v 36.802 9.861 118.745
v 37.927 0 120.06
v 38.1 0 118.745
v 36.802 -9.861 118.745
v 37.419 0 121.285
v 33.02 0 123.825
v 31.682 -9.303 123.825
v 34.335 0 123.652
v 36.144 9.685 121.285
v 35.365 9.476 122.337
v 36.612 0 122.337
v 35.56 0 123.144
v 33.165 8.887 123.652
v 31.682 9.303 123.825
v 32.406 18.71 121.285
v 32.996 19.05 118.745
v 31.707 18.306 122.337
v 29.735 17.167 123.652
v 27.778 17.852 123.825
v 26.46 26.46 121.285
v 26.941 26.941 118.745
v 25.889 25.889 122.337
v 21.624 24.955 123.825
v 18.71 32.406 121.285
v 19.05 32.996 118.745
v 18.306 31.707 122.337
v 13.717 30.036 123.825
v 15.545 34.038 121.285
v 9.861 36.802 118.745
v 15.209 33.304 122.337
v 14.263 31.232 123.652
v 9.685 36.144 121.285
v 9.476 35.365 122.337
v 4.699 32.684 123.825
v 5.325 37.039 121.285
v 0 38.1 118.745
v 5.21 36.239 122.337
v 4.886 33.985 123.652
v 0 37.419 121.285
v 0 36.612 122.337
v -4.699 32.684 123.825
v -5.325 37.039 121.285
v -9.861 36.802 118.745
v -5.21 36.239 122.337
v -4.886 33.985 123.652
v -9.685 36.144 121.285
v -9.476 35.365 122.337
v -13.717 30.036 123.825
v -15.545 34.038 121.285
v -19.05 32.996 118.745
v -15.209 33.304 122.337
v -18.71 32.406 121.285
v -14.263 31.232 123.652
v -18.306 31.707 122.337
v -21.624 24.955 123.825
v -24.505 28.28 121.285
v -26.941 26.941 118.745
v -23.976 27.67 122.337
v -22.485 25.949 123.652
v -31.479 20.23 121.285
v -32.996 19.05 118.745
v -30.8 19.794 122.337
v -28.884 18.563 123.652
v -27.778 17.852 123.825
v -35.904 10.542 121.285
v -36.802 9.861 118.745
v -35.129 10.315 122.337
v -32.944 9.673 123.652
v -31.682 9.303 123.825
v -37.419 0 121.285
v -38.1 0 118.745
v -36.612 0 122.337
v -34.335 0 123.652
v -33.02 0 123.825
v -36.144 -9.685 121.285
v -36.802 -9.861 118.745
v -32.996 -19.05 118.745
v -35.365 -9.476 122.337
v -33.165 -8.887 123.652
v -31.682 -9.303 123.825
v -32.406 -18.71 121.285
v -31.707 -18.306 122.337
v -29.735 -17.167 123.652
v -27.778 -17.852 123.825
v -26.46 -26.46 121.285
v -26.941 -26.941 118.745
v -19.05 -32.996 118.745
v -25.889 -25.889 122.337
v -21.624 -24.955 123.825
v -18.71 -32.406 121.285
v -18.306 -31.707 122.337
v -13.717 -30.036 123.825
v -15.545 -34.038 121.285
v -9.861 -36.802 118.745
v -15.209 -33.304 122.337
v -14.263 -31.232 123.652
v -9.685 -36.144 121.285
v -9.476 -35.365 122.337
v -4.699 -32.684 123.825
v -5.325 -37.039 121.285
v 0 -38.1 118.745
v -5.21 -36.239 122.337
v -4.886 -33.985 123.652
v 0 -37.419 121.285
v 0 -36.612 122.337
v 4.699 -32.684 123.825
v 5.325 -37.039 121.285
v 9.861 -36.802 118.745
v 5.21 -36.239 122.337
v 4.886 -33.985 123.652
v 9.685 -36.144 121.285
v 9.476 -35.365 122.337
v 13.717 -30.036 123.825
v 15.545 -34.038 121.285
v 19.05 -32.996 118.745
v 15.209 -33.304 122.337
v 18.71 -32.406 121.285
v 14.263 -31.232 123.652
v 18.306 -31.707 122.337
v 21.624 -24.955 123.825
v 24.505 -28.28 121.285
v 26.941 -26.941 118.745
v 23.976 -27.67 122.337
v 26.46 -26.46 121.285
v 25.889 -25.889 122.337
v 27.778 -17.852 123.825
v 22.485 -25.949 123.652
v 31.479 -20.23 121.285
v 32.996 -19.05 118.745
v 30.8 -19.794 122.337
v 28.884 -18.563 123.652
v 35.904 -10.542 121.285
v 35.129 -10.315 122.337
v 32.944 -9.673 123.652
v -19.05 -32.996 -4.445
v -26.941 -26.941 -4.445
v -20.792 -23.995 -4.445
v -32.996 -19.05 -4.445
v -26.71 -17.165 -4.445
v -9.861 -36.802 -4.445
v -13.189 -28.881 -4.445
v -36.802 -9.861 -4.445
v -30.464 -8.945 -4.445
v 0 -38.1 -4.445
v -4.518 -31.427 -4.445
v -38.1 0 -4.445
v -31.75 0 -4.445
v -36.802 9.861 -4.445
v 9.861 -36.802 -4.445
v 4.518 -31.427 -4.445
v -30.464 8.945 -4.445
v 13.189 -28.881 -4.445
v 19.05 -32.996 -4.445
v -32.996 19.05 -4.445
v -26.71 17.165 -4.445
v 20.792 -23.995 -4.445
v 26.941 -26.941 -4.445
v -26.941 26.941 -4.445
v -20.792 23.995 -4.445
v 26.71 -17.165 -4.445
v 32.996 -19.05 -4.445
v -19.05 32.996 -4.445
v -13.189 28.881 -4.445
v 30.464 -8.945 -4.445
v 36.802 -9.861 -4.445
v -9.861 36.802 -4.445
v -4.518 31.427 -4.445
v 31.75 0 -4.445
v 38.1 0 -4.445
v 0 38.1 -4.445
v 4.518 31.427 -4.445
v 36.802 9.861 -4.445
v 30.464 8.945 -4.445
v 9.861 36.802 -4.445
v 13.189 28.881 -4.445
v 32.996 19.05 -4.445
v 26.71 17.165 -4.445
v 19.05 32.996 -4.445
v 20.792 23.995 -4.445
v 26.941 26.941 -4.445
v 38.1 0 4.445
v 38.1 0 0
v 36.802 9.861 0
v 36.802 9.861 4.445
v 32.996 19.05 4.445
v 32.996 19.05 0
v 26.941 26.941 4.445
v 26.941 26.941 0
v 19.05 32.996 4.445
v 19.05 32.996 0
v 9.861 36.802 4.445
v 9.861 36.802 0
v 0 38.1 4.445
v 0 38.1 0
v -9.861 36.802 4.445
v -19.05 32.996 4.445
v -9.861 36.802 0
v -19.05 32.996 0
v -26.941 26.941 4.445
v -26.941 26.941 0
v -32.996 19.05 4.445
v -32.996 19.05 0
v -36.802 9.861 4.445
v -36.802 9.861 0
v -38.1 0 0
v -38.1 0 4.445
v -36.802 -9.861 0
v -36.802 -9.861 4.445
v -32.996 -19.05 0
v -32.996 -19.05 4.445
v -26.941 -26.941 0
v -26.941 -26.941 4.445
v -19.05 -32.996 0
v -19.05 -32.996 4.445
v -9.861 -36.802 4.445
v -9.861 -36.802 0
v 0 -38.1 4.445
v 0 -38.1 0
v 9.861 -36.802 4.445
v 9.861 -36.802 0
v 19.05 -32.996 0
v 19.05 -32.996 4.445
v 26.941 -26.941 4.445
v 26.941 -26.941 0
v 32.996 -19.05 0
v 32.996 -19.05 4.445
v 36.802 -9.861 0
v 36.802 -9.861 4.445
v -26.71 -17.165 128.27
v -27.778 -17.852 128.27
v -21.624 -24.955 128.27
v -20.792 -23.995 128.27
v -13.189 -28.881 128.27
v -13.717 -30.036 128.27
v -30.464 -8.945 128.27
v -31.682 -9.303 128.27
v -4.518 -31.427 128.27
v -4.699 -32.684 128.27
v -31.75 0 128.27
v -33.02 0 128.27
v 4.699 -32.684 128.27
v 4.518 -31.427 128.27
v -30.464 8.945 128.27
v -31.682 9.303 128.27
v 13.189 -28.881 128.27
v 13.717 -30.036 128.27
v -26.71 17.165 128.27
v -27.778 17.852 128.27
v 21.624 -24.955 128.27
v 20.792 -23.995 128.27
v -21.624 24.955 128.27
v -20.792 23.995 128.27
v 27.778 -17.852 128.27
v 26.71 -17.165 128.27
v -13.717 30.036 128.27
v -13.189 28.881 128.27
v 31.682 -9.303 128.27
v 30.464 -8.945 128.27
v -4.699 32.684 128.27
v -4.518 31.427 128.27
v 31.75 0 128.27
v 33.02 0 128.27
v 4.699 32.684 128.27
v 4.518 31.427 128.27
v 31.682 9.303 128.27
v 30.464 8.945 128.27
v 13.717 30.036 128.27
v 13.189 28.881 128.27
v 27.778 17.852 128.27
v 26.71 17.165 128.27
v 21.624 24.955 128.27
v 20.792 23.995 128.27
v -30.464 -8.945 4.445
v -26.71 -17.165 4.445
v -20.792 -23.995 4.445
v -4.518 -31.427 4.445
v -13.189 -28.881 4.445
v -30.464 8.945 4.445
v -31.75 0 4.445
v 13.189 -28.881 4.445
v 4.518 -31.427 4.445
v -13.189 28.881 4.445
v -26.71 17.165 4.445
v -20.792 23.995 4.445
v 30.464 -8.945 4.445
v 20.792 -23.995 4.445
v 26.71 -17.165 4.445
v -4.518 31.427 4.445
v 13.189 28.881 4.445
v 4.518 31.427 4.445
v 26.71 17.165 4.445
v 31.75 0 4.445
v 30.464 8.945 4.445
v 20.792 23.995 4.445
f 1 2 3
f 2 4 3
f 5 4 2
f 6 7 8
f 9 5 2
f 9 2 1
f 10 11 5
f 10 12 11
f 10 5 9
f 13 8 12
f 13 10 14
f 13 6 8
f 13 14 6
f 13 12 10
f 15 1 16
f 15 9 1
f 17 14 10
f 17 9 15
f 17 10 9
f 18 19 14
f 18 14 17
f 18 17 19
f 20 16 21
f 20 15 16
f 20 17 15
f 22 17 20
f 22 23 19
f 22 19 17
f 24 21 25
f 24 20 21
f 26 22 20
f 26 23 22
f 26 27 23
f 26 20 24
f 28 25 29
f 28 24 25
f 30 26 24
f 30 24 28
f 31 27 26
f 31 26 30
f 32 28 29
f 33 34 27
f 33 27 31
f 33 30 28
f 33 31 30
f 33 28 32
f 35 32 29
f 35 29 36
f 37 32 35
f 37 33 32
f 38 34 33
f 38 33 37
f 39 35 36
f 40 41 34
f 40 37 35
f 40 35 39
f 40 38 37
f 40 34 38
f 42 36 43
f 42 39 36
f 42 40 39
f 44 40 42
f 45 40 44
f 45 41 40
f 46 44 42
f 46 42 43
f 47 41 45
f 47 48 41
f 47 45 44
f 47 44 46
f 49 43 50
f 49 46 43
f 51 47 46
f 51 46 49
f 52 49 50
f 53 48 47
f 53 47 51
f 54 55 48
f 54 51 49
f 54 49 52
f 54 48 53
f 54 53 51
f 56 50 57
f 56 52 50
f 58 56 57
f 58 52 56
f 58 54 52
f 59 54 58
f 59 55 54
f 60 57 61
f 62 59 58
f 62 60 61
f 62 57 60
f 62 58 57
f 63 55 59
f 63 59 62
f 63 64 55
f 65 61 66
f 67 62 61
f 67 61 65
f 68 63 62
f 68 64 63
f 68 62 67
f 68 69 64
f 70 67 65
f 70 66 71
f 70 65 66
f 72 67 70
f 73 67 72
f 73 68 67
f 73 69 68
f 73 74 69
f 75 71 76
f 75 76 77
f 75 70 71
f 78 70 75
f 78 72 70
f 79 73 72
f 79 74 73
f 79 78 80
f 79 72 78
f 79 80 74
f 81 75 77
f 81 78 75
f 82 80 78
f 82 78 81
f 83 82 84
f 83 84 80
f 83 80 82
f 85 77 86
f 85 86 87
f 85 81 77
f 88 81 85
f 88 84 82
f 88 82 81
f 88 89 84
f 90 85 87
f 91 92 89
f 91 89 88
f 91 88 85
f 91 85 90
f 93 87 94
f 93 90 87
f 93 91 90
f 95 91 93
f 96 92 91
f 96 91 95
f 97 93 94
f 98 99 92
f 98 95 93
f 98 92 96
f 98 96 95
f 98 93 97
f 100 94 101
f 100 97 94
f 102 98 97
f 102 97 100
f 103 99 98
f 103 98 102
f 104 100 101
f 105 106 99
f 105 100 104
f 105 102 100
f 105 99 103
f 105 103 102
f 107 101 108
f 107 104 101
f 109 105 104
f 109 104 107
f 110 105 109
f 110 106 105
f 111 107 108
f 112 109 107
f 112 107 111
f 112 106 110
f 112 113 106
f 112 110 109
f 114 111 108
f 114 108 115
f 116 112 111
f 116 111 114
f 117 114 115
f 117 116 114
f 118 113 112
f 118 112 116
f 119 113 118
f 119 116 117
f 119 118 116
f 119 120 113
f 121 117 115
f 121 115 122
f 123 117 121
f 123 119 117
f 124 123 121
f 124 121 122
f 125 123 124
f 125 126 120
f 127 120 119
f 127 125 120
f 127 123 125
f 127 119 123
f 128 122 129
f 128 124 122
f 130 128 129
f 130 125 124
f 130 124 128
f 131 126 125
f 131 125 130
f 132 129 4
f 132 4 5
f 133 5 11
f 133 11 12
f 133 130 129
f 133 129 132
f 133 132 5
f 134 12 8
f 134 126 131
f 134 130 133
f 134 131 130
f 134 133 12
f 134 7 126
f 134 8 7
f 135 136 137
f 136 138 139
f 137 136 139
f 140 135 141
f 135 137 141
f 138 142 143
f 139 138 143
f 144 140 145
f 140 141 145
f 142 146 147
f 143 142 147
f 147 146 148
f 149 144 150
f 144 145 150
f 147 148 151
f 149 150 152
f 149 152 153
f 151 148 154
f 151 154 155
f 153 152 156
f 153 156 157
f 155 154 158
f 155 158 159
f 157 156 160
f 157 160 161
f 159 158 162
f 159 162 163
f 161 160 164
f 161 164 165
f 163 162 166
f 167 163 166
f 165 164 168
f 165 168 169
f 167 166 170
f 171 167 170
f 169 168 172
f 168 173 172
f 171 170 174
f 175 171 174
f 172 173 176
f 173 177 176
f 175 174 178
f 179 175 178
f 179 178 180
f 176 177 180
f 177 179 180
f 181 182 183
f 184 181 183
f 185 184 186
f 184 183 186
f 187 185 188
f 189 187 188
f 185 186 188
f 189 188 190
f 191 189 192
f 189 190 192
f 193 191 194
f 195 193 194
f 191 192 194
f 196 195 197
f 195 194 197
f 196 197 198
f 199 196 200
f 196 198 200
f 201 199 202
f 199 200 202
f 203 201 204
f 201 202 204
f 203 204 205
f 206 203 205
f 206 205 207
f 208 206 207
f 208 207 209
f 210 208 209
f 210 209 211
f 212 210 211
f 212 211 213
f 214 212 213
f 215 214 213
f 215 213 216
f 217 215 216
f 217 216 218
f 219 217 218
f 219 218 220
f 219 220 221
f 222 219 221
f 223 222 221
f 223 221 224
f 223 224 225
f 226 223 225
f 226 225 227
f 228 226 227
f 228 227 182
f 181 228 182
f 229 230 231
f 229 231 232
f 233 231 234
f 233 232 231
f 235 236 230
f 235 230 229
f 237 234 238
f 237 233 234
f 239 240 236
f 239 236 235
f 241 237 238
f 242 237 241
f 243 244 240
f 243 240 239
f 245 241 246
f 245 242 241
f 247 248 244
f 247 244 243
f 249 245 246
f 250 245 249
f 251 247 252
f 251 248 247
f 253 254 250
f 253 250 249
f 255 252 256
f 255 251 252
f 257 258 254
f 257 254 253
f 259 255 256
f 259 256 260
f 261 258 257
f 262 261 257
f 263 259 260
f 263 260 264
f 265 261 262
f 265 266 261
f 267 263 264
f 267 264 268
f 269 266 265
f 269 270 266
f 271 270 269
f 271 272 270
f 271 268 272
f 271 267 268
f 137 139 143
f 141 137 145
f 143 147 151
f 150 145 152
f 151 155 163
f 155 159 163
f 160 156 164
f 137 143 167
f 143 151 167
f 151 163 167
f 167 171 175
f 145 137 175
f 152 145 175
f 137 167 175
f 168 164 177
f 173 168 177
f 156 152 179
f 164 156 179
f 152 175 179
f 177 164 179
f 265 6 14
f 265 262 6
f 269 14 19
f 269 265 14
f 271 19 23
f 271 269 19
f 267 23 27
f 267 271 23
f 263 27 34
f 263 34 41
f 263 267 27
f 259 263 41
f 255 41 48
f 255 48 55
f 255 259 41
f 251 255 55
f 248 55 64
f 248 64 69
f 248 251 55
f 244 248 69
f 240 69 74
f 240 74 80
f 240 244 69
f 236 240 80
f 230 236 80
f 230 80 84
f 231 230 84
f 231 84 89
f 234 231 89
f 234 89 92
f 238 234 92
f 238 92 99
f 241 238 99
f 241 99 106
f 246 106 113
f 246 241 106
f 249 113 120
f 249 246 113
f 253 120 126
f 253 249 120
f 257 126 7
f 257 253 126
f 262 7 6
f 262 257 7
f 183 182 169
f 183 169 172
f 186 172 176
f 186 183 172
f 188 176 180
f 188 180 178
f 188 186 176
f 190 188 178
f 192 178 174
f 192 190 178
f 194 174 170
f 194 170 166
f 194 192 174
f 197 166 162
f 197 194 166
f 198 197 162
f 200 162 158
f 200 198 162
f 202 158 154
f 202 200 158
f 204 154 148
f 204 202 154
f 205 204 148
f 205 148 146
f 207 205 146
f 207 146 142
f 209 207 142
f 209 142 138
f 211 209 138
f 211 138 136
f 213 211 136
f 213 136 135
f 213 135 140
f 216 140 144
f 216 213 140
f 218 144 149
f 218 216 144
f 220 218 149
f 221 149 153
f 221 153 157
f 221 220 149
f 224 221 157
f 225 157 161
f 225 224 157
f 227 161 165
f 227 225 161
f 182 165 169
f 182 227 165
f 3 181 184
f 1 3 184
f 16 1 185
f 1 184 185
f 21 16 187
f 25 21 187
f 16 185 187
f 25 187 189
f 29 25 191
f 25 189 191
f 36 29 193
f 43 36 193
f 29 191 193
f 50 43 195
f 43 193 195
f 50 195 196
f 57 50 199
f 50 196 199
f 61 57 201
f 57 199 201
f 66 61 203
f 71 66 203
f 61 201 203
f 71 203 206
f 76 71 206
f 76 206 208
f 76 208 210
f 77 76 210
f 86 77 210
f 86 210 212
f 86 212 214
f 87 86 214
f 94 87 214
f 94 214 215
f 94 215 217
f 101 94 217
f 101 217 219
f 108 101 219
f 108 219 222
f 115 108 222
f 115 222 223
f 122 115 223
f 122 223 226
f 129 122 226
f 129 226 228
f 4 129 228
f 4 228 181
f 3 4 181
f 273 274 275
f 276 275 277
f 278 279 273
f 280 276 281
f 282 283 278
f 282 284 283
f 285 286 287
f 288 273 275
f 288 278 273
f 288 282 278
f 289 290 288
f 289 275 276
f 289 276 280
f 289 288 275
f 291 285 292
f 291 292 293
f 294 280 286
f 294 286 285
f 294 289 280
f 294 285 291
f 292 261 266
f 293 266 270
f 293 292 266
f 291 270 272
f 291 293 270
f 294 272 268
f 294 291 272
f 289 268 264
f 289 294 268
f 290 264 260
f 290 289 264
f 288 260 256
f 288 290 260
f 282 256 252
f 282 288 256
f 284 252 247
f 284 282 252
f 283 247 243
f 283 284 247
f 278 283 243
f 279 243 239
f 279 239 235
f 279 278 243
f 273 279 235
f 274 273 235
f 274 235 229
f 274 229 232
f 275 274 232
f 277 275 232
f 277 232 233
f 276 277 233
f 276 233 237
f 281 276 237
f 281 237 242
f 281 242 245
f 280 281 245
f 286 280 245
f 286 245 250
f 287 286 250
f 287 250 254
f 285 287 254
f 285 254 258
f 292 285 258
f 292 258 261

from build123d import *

# Parameters (mm, degrees)
F0_R         = 38.1
F0_R_2       = 31.75
F1_DEPTH     = 123.825
F2_R         = 5.08
F3_R         = 38.1
F3_R_2       = 31.75
F1_FACE_R    = 38.1
F1_FACE_R_2  = 31.75
F1_FACE1_R   = 33.02
F1_FACE1_R_2 = 31.75
F4_DEPTH     = 4.445


with BuildPart() as f1:
    # F0 (on Top) → F1 (new body)
    with BuildSketch(Plane.XY):
        Circle(F0_R)
        Circle(F0_R_2, mode=Mode.SUBTRACT)
    extrude(amount=F1_DEPTH)

    # F2
    f2_edges = [f1.edges().sort_by_distance(p)[0] for p in [
        (-38.1, 0, 123.825),
    ]]
    fillet(f2_edges, radius=F2_R)

    # F3 (on face) + F1_face (on face) + F0 (on Top) + F1_face1 (on face) → F4 (join, symmetric)
    with BuildSketch(Plane.XY):
        Circle(F3_R)
        Circle(F3_R_2, mode=Mode.SUBTRACT)
        Circle(F3_R_2)
    with BuildSketch(Plane(origin=(0, 0, 0), x_dir=(1, 0, 0), z_dir=(0, 0, -1))):
        Circle(F1_FACE_R)
        Circle(F1_FACE_R_2, mode=Mode.SUBTRACT)
    with BuildSketch(Plane.XY):
        Circle(F0_R)
        Circle(F0_R_2, mode=Mode.SUBTRACT)
    with BuildSketch(Plane.XY.offset(123.825)):
        Circle(F1_FACE1_R)
        Circle(F1_FACE1_R_2, mode=Mode.SUBTRACT)
    extrude(amount=F4_DEPTH, both=True, dir=(0, 0, 1))


solid = f1.part
